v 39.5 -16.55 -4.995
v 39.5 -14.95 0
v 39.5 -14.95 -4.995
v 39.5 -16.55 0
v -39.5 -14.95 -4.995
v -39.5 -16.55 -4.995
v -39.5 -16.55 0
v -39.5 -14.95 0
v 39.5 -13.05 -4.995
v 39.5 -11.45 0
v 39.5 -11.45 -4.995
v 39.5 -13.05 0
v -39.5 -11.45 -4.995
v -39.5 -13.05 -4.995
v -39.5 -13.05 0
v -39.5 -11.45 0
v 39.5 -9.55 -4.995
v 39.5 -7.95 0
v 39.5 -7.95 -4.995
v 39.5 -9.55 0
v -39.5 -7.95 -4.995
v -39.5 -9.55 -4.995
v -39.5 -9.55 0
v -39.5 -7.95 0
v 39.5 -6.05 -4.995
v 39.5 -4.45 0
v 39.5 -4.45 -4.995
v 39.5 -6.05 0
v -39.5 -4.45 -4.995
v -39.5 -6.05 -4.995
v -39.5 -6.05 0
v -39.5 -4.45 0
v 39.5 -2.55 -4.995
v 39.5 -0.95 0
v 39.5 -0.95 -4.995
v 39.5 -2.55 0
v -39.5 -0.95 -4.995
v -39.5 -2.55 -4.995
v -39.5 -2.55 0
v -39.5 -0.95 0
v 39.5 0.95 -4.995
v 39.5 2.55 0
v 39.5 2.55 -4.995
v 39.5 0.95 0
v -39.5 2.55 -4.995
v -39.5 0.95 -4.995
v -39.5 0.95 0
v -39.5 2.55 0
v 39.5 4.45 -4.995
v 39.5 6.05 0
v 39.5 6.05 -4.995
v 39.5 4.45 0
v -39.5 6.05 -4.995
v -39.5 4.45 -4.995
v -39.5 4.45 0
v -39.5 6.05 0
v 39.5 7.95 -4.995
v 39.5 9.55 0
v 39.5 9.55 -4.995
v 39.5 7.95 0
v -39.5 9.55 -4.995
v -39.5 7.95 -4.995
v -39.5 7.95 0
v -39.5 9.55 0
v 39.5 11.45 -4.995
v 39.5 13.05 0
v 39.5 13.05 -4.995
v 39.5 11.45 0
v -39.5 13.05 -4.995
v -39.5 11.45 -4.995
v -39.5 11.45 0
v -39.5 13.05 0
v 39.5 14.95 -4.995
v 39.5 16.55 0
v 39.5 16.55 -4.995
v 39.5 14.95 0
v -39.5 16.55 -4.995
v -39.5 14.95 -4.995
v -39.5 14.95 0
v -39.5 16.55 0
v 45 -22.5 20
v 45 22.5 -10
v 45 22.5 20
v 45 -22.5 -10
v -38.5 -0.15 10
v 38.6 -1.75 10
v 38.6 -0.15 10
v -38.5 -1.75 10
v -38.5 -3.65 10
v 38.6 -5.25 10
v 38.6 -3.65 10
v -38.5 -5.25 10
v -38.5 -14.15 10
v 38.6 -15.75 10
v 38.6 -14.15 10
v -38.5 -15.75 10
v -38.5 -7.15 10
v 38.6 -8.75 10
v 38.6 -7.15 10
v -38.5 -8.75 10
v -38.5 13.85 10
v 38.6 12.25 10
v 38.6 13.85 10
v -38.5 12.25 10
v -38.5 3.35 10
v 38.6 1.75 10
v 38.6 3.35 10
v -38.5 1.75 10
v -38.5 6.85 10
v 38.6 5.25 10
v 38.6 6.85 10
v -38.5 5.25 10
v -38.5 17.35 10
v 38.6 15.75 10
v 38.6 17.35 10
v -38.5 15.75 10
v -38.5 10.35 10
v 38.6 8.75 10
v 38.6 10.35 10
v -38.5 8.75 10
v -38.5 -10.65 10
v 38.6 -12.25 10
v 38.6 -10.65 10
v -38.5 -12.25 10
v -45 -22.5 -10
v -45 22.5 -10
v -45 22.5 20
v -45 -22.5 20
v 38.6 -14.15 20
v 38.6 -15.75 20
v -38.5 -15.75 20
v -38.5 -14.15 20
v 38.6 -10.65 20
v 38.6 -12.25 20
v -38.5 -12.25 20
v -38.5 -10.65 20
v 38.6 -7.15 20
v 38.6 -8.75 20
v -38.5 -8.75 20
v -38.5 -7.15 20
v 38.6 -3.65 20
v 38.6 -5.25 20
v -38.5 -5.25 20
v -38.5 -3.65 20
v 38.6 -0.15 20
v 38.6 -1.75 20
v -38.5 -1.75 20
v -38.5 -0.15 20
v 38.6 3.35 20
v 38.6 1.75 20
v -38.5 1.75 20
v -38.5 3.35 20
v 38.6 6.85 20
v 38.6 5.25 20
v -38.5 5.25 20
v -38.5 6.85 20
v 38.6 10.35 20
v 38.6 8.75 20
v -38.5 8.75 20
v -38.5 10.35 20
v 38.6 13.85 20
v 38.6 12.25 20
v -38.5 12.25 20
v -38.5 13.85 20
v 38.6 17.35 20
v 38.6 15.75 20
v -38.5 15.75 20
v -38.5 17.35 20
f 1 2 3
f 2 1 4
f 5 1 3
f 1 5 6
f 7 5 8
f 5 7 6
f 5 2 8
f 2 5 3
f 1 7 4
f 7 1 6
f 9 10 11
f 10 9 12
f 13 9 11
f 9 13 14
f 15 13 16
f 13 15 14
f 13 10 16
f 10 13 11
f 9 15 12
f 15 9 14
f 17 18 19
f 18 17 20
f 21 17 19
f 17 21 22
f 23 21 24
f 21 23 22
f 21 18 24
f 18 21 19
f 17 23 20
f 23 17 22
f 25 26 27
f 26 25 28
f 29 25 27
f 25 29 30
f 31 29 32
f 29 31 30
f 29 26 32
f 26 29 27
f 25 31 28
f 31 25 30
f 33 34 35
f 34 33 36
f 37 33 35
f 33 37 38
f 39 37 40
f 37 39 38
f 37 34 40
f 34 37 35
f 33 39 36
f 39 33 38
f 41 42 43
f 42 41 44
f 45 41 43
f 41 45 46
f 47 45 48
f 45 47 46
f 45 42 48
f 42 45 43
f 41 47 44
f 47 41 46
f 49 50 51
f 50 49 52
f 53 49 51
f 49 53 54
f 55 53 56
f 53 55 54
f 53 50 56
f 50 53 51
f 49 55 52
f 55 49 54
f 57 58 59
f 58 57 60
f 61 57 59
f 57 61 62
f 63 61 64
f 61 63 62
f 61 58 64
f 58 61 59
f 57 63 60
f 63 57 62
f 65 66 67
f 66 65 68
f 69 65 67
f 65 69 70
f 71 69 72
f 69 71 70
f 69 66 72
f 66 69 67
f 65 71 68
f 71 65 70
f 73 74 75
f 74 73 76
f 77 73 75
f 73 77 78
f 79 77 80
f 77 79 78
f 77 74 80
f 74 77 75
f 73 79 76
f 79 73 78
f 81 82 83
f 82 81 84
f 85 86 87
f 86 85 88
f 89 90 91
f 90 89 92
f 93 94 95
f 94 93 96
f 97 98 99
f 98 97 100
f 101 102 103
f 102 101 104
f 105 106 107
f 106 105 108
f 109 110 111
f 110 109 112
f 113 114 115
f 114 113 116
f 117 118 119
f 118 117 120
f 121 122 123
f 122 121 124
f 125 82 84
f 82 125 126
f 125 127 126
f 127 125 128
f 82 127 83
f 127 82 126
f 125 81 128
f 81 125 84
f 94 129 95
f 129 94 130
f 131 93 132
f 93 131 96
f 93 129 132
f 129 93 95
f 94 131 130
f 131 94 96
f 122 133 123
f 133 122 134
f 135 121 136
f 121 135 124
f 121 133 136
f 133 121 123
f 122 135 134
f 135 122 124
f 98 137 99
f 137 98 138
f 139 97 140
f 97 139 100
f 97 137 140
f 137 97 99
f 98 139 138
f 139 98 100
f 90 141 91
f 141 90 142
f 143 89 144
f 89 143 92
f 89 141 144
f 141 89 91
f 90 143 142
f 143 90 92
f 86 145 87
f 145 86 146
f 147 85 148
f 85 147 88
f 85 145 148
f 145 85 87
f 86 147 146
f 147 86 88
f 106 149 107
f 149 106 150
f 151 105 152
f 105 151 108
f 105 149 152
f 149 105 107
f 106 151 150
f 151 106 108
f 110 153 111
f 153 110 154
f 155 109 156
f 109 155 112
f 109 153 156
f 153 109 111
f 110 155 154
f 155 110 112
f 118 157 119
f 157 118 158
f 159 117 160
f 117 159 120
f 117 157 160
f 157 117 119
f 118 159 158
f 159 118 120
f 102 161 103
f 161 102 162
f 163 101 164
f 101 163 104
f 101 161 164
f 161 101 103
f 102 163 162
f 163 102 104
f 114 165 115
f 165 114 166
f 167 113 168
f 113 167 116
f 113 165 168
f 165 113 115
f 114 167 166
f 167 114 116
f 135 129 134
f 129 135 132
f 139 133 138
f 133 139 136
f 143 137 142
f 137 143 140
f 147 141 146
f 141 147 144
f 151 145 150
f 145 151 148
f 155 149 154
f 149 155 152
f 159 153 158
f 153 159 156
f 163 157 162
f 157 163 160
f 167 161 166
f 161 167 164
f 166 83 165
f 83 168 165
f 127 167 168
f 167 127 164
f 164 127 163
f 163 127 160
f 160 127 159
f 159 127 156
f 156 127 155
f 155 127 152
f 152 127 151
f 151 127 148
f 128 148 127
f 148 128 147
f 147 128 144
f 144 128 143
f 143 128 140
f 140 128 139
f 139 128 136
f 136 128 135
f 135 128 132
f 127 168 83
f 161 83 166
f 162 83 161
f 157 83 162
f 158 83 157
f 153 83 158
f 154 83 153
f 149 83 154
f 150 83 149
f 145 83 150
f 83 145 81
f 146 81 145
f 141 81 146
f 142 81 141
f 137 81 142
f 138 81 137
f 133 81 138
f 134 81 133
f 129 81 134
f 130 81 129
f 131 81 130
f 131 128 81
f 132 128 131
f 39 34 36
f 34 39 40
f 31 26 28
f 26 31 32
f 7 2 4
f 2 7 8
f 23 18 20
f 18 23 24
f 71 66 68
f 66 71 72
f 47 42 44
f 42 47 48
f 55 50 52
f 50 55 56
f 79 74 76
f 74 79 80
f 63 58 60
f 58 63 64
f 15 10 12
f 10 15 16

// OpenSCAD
// Microscope Slide Drying Rack
// Designed for 10 slides (75x25x1mm) standing on long edge

// --- Dimensions ---
block_length = 90.0;      // X dimension of the base block
block_width = 45.0;       // Y dimension of the base block
block_height = 20.0;      // Z dimension of the base block

slot_length = 77.0;       // X dimension of the slots
slot_width = 1.6;         // Y dimension of the slots
slot_depth = 10.0;        // Z depth of the slots

slot_spacing = 3.5;       // Y center-to-center distance between slots
num_slots = 10;           // Number of slots

// --- Resolution ---
$fn = 64;

// --- Implementation ---

// The base block
difference() {
    // Main block body
    cube([block_length, block_width, block_height], center = true);

    // Create the slots
    // We calculate the starting Y position to center the group of slots
    // Total span of centers = (num_slots - 1) * spacing
    // We subtract half the slot width to find the edge of the first slot
    translate([0, -(num_slots - 1) * slot_spacing / 2, block_height / 2 - slot_depth + 0.01]) {
        for (i = [0 : num_slots - 1]) {
            translate([0, i * slot_spacing, 0]) {
                // Each slot is a cube. 
                // We extend the length slightly in X to ensure a clean cut through the block
                cube([slot_length + 2, slot_width, slot_depth + 0.01], center = true);
            }
        }
    }
}

// Note: The block is centered on the origin. 
// The base of the block is at Z = -block_height/2.
// To make the base sit at Z = 0 as requested:
translate([0, 0, block_height / 2]) {
    // This is a trick to shift the whole object so the bottom face is at Z=0
    // However, the prompt says "rests on the XY plane at z = 0".
    // I will wrap the whole logic in a translation to ensure Z=0 is the bottom.
}

// Corrected assembly to ensure Z=0 is the bottom face
// (Re-writing the logic to be absolute)

module rack_geometry() {
    difference() {
        // Base block
        cube([block_length, block_width, block_height]);

        // Slots
        // Calculate Y offset to center the group of slots
        // The center of the group is at block_width / 2
        // The distance from center of first slot to center of last slot is (num_slots-1)*slot_spacing
        let(total_slot_span = (num_slots - 1) * slot_spacing)
        translate([(block_length - slot_length) / 2, (block_width - total_slot_span) / 2, block_height - slot_depth]) {
            for (i = [0 : num_slots - 1]) {
                translate([0, i * slot_spacing, 0]) {
                    // We use a slightly larger length and width to ensure clean cuts
                    cube([slot_length + 0.1, slot_width, slot_depth + 0.1]);
                }
            }
        }
    }
}

// Final Rendered Object
// Positioned so the bottom face is at Z=0
translate([0, 0, 0]) {
    // Center the block on X and Y
    translate([-block_length/2, -block_width/2, 0]) {
        rack_geometry();
    }
}
